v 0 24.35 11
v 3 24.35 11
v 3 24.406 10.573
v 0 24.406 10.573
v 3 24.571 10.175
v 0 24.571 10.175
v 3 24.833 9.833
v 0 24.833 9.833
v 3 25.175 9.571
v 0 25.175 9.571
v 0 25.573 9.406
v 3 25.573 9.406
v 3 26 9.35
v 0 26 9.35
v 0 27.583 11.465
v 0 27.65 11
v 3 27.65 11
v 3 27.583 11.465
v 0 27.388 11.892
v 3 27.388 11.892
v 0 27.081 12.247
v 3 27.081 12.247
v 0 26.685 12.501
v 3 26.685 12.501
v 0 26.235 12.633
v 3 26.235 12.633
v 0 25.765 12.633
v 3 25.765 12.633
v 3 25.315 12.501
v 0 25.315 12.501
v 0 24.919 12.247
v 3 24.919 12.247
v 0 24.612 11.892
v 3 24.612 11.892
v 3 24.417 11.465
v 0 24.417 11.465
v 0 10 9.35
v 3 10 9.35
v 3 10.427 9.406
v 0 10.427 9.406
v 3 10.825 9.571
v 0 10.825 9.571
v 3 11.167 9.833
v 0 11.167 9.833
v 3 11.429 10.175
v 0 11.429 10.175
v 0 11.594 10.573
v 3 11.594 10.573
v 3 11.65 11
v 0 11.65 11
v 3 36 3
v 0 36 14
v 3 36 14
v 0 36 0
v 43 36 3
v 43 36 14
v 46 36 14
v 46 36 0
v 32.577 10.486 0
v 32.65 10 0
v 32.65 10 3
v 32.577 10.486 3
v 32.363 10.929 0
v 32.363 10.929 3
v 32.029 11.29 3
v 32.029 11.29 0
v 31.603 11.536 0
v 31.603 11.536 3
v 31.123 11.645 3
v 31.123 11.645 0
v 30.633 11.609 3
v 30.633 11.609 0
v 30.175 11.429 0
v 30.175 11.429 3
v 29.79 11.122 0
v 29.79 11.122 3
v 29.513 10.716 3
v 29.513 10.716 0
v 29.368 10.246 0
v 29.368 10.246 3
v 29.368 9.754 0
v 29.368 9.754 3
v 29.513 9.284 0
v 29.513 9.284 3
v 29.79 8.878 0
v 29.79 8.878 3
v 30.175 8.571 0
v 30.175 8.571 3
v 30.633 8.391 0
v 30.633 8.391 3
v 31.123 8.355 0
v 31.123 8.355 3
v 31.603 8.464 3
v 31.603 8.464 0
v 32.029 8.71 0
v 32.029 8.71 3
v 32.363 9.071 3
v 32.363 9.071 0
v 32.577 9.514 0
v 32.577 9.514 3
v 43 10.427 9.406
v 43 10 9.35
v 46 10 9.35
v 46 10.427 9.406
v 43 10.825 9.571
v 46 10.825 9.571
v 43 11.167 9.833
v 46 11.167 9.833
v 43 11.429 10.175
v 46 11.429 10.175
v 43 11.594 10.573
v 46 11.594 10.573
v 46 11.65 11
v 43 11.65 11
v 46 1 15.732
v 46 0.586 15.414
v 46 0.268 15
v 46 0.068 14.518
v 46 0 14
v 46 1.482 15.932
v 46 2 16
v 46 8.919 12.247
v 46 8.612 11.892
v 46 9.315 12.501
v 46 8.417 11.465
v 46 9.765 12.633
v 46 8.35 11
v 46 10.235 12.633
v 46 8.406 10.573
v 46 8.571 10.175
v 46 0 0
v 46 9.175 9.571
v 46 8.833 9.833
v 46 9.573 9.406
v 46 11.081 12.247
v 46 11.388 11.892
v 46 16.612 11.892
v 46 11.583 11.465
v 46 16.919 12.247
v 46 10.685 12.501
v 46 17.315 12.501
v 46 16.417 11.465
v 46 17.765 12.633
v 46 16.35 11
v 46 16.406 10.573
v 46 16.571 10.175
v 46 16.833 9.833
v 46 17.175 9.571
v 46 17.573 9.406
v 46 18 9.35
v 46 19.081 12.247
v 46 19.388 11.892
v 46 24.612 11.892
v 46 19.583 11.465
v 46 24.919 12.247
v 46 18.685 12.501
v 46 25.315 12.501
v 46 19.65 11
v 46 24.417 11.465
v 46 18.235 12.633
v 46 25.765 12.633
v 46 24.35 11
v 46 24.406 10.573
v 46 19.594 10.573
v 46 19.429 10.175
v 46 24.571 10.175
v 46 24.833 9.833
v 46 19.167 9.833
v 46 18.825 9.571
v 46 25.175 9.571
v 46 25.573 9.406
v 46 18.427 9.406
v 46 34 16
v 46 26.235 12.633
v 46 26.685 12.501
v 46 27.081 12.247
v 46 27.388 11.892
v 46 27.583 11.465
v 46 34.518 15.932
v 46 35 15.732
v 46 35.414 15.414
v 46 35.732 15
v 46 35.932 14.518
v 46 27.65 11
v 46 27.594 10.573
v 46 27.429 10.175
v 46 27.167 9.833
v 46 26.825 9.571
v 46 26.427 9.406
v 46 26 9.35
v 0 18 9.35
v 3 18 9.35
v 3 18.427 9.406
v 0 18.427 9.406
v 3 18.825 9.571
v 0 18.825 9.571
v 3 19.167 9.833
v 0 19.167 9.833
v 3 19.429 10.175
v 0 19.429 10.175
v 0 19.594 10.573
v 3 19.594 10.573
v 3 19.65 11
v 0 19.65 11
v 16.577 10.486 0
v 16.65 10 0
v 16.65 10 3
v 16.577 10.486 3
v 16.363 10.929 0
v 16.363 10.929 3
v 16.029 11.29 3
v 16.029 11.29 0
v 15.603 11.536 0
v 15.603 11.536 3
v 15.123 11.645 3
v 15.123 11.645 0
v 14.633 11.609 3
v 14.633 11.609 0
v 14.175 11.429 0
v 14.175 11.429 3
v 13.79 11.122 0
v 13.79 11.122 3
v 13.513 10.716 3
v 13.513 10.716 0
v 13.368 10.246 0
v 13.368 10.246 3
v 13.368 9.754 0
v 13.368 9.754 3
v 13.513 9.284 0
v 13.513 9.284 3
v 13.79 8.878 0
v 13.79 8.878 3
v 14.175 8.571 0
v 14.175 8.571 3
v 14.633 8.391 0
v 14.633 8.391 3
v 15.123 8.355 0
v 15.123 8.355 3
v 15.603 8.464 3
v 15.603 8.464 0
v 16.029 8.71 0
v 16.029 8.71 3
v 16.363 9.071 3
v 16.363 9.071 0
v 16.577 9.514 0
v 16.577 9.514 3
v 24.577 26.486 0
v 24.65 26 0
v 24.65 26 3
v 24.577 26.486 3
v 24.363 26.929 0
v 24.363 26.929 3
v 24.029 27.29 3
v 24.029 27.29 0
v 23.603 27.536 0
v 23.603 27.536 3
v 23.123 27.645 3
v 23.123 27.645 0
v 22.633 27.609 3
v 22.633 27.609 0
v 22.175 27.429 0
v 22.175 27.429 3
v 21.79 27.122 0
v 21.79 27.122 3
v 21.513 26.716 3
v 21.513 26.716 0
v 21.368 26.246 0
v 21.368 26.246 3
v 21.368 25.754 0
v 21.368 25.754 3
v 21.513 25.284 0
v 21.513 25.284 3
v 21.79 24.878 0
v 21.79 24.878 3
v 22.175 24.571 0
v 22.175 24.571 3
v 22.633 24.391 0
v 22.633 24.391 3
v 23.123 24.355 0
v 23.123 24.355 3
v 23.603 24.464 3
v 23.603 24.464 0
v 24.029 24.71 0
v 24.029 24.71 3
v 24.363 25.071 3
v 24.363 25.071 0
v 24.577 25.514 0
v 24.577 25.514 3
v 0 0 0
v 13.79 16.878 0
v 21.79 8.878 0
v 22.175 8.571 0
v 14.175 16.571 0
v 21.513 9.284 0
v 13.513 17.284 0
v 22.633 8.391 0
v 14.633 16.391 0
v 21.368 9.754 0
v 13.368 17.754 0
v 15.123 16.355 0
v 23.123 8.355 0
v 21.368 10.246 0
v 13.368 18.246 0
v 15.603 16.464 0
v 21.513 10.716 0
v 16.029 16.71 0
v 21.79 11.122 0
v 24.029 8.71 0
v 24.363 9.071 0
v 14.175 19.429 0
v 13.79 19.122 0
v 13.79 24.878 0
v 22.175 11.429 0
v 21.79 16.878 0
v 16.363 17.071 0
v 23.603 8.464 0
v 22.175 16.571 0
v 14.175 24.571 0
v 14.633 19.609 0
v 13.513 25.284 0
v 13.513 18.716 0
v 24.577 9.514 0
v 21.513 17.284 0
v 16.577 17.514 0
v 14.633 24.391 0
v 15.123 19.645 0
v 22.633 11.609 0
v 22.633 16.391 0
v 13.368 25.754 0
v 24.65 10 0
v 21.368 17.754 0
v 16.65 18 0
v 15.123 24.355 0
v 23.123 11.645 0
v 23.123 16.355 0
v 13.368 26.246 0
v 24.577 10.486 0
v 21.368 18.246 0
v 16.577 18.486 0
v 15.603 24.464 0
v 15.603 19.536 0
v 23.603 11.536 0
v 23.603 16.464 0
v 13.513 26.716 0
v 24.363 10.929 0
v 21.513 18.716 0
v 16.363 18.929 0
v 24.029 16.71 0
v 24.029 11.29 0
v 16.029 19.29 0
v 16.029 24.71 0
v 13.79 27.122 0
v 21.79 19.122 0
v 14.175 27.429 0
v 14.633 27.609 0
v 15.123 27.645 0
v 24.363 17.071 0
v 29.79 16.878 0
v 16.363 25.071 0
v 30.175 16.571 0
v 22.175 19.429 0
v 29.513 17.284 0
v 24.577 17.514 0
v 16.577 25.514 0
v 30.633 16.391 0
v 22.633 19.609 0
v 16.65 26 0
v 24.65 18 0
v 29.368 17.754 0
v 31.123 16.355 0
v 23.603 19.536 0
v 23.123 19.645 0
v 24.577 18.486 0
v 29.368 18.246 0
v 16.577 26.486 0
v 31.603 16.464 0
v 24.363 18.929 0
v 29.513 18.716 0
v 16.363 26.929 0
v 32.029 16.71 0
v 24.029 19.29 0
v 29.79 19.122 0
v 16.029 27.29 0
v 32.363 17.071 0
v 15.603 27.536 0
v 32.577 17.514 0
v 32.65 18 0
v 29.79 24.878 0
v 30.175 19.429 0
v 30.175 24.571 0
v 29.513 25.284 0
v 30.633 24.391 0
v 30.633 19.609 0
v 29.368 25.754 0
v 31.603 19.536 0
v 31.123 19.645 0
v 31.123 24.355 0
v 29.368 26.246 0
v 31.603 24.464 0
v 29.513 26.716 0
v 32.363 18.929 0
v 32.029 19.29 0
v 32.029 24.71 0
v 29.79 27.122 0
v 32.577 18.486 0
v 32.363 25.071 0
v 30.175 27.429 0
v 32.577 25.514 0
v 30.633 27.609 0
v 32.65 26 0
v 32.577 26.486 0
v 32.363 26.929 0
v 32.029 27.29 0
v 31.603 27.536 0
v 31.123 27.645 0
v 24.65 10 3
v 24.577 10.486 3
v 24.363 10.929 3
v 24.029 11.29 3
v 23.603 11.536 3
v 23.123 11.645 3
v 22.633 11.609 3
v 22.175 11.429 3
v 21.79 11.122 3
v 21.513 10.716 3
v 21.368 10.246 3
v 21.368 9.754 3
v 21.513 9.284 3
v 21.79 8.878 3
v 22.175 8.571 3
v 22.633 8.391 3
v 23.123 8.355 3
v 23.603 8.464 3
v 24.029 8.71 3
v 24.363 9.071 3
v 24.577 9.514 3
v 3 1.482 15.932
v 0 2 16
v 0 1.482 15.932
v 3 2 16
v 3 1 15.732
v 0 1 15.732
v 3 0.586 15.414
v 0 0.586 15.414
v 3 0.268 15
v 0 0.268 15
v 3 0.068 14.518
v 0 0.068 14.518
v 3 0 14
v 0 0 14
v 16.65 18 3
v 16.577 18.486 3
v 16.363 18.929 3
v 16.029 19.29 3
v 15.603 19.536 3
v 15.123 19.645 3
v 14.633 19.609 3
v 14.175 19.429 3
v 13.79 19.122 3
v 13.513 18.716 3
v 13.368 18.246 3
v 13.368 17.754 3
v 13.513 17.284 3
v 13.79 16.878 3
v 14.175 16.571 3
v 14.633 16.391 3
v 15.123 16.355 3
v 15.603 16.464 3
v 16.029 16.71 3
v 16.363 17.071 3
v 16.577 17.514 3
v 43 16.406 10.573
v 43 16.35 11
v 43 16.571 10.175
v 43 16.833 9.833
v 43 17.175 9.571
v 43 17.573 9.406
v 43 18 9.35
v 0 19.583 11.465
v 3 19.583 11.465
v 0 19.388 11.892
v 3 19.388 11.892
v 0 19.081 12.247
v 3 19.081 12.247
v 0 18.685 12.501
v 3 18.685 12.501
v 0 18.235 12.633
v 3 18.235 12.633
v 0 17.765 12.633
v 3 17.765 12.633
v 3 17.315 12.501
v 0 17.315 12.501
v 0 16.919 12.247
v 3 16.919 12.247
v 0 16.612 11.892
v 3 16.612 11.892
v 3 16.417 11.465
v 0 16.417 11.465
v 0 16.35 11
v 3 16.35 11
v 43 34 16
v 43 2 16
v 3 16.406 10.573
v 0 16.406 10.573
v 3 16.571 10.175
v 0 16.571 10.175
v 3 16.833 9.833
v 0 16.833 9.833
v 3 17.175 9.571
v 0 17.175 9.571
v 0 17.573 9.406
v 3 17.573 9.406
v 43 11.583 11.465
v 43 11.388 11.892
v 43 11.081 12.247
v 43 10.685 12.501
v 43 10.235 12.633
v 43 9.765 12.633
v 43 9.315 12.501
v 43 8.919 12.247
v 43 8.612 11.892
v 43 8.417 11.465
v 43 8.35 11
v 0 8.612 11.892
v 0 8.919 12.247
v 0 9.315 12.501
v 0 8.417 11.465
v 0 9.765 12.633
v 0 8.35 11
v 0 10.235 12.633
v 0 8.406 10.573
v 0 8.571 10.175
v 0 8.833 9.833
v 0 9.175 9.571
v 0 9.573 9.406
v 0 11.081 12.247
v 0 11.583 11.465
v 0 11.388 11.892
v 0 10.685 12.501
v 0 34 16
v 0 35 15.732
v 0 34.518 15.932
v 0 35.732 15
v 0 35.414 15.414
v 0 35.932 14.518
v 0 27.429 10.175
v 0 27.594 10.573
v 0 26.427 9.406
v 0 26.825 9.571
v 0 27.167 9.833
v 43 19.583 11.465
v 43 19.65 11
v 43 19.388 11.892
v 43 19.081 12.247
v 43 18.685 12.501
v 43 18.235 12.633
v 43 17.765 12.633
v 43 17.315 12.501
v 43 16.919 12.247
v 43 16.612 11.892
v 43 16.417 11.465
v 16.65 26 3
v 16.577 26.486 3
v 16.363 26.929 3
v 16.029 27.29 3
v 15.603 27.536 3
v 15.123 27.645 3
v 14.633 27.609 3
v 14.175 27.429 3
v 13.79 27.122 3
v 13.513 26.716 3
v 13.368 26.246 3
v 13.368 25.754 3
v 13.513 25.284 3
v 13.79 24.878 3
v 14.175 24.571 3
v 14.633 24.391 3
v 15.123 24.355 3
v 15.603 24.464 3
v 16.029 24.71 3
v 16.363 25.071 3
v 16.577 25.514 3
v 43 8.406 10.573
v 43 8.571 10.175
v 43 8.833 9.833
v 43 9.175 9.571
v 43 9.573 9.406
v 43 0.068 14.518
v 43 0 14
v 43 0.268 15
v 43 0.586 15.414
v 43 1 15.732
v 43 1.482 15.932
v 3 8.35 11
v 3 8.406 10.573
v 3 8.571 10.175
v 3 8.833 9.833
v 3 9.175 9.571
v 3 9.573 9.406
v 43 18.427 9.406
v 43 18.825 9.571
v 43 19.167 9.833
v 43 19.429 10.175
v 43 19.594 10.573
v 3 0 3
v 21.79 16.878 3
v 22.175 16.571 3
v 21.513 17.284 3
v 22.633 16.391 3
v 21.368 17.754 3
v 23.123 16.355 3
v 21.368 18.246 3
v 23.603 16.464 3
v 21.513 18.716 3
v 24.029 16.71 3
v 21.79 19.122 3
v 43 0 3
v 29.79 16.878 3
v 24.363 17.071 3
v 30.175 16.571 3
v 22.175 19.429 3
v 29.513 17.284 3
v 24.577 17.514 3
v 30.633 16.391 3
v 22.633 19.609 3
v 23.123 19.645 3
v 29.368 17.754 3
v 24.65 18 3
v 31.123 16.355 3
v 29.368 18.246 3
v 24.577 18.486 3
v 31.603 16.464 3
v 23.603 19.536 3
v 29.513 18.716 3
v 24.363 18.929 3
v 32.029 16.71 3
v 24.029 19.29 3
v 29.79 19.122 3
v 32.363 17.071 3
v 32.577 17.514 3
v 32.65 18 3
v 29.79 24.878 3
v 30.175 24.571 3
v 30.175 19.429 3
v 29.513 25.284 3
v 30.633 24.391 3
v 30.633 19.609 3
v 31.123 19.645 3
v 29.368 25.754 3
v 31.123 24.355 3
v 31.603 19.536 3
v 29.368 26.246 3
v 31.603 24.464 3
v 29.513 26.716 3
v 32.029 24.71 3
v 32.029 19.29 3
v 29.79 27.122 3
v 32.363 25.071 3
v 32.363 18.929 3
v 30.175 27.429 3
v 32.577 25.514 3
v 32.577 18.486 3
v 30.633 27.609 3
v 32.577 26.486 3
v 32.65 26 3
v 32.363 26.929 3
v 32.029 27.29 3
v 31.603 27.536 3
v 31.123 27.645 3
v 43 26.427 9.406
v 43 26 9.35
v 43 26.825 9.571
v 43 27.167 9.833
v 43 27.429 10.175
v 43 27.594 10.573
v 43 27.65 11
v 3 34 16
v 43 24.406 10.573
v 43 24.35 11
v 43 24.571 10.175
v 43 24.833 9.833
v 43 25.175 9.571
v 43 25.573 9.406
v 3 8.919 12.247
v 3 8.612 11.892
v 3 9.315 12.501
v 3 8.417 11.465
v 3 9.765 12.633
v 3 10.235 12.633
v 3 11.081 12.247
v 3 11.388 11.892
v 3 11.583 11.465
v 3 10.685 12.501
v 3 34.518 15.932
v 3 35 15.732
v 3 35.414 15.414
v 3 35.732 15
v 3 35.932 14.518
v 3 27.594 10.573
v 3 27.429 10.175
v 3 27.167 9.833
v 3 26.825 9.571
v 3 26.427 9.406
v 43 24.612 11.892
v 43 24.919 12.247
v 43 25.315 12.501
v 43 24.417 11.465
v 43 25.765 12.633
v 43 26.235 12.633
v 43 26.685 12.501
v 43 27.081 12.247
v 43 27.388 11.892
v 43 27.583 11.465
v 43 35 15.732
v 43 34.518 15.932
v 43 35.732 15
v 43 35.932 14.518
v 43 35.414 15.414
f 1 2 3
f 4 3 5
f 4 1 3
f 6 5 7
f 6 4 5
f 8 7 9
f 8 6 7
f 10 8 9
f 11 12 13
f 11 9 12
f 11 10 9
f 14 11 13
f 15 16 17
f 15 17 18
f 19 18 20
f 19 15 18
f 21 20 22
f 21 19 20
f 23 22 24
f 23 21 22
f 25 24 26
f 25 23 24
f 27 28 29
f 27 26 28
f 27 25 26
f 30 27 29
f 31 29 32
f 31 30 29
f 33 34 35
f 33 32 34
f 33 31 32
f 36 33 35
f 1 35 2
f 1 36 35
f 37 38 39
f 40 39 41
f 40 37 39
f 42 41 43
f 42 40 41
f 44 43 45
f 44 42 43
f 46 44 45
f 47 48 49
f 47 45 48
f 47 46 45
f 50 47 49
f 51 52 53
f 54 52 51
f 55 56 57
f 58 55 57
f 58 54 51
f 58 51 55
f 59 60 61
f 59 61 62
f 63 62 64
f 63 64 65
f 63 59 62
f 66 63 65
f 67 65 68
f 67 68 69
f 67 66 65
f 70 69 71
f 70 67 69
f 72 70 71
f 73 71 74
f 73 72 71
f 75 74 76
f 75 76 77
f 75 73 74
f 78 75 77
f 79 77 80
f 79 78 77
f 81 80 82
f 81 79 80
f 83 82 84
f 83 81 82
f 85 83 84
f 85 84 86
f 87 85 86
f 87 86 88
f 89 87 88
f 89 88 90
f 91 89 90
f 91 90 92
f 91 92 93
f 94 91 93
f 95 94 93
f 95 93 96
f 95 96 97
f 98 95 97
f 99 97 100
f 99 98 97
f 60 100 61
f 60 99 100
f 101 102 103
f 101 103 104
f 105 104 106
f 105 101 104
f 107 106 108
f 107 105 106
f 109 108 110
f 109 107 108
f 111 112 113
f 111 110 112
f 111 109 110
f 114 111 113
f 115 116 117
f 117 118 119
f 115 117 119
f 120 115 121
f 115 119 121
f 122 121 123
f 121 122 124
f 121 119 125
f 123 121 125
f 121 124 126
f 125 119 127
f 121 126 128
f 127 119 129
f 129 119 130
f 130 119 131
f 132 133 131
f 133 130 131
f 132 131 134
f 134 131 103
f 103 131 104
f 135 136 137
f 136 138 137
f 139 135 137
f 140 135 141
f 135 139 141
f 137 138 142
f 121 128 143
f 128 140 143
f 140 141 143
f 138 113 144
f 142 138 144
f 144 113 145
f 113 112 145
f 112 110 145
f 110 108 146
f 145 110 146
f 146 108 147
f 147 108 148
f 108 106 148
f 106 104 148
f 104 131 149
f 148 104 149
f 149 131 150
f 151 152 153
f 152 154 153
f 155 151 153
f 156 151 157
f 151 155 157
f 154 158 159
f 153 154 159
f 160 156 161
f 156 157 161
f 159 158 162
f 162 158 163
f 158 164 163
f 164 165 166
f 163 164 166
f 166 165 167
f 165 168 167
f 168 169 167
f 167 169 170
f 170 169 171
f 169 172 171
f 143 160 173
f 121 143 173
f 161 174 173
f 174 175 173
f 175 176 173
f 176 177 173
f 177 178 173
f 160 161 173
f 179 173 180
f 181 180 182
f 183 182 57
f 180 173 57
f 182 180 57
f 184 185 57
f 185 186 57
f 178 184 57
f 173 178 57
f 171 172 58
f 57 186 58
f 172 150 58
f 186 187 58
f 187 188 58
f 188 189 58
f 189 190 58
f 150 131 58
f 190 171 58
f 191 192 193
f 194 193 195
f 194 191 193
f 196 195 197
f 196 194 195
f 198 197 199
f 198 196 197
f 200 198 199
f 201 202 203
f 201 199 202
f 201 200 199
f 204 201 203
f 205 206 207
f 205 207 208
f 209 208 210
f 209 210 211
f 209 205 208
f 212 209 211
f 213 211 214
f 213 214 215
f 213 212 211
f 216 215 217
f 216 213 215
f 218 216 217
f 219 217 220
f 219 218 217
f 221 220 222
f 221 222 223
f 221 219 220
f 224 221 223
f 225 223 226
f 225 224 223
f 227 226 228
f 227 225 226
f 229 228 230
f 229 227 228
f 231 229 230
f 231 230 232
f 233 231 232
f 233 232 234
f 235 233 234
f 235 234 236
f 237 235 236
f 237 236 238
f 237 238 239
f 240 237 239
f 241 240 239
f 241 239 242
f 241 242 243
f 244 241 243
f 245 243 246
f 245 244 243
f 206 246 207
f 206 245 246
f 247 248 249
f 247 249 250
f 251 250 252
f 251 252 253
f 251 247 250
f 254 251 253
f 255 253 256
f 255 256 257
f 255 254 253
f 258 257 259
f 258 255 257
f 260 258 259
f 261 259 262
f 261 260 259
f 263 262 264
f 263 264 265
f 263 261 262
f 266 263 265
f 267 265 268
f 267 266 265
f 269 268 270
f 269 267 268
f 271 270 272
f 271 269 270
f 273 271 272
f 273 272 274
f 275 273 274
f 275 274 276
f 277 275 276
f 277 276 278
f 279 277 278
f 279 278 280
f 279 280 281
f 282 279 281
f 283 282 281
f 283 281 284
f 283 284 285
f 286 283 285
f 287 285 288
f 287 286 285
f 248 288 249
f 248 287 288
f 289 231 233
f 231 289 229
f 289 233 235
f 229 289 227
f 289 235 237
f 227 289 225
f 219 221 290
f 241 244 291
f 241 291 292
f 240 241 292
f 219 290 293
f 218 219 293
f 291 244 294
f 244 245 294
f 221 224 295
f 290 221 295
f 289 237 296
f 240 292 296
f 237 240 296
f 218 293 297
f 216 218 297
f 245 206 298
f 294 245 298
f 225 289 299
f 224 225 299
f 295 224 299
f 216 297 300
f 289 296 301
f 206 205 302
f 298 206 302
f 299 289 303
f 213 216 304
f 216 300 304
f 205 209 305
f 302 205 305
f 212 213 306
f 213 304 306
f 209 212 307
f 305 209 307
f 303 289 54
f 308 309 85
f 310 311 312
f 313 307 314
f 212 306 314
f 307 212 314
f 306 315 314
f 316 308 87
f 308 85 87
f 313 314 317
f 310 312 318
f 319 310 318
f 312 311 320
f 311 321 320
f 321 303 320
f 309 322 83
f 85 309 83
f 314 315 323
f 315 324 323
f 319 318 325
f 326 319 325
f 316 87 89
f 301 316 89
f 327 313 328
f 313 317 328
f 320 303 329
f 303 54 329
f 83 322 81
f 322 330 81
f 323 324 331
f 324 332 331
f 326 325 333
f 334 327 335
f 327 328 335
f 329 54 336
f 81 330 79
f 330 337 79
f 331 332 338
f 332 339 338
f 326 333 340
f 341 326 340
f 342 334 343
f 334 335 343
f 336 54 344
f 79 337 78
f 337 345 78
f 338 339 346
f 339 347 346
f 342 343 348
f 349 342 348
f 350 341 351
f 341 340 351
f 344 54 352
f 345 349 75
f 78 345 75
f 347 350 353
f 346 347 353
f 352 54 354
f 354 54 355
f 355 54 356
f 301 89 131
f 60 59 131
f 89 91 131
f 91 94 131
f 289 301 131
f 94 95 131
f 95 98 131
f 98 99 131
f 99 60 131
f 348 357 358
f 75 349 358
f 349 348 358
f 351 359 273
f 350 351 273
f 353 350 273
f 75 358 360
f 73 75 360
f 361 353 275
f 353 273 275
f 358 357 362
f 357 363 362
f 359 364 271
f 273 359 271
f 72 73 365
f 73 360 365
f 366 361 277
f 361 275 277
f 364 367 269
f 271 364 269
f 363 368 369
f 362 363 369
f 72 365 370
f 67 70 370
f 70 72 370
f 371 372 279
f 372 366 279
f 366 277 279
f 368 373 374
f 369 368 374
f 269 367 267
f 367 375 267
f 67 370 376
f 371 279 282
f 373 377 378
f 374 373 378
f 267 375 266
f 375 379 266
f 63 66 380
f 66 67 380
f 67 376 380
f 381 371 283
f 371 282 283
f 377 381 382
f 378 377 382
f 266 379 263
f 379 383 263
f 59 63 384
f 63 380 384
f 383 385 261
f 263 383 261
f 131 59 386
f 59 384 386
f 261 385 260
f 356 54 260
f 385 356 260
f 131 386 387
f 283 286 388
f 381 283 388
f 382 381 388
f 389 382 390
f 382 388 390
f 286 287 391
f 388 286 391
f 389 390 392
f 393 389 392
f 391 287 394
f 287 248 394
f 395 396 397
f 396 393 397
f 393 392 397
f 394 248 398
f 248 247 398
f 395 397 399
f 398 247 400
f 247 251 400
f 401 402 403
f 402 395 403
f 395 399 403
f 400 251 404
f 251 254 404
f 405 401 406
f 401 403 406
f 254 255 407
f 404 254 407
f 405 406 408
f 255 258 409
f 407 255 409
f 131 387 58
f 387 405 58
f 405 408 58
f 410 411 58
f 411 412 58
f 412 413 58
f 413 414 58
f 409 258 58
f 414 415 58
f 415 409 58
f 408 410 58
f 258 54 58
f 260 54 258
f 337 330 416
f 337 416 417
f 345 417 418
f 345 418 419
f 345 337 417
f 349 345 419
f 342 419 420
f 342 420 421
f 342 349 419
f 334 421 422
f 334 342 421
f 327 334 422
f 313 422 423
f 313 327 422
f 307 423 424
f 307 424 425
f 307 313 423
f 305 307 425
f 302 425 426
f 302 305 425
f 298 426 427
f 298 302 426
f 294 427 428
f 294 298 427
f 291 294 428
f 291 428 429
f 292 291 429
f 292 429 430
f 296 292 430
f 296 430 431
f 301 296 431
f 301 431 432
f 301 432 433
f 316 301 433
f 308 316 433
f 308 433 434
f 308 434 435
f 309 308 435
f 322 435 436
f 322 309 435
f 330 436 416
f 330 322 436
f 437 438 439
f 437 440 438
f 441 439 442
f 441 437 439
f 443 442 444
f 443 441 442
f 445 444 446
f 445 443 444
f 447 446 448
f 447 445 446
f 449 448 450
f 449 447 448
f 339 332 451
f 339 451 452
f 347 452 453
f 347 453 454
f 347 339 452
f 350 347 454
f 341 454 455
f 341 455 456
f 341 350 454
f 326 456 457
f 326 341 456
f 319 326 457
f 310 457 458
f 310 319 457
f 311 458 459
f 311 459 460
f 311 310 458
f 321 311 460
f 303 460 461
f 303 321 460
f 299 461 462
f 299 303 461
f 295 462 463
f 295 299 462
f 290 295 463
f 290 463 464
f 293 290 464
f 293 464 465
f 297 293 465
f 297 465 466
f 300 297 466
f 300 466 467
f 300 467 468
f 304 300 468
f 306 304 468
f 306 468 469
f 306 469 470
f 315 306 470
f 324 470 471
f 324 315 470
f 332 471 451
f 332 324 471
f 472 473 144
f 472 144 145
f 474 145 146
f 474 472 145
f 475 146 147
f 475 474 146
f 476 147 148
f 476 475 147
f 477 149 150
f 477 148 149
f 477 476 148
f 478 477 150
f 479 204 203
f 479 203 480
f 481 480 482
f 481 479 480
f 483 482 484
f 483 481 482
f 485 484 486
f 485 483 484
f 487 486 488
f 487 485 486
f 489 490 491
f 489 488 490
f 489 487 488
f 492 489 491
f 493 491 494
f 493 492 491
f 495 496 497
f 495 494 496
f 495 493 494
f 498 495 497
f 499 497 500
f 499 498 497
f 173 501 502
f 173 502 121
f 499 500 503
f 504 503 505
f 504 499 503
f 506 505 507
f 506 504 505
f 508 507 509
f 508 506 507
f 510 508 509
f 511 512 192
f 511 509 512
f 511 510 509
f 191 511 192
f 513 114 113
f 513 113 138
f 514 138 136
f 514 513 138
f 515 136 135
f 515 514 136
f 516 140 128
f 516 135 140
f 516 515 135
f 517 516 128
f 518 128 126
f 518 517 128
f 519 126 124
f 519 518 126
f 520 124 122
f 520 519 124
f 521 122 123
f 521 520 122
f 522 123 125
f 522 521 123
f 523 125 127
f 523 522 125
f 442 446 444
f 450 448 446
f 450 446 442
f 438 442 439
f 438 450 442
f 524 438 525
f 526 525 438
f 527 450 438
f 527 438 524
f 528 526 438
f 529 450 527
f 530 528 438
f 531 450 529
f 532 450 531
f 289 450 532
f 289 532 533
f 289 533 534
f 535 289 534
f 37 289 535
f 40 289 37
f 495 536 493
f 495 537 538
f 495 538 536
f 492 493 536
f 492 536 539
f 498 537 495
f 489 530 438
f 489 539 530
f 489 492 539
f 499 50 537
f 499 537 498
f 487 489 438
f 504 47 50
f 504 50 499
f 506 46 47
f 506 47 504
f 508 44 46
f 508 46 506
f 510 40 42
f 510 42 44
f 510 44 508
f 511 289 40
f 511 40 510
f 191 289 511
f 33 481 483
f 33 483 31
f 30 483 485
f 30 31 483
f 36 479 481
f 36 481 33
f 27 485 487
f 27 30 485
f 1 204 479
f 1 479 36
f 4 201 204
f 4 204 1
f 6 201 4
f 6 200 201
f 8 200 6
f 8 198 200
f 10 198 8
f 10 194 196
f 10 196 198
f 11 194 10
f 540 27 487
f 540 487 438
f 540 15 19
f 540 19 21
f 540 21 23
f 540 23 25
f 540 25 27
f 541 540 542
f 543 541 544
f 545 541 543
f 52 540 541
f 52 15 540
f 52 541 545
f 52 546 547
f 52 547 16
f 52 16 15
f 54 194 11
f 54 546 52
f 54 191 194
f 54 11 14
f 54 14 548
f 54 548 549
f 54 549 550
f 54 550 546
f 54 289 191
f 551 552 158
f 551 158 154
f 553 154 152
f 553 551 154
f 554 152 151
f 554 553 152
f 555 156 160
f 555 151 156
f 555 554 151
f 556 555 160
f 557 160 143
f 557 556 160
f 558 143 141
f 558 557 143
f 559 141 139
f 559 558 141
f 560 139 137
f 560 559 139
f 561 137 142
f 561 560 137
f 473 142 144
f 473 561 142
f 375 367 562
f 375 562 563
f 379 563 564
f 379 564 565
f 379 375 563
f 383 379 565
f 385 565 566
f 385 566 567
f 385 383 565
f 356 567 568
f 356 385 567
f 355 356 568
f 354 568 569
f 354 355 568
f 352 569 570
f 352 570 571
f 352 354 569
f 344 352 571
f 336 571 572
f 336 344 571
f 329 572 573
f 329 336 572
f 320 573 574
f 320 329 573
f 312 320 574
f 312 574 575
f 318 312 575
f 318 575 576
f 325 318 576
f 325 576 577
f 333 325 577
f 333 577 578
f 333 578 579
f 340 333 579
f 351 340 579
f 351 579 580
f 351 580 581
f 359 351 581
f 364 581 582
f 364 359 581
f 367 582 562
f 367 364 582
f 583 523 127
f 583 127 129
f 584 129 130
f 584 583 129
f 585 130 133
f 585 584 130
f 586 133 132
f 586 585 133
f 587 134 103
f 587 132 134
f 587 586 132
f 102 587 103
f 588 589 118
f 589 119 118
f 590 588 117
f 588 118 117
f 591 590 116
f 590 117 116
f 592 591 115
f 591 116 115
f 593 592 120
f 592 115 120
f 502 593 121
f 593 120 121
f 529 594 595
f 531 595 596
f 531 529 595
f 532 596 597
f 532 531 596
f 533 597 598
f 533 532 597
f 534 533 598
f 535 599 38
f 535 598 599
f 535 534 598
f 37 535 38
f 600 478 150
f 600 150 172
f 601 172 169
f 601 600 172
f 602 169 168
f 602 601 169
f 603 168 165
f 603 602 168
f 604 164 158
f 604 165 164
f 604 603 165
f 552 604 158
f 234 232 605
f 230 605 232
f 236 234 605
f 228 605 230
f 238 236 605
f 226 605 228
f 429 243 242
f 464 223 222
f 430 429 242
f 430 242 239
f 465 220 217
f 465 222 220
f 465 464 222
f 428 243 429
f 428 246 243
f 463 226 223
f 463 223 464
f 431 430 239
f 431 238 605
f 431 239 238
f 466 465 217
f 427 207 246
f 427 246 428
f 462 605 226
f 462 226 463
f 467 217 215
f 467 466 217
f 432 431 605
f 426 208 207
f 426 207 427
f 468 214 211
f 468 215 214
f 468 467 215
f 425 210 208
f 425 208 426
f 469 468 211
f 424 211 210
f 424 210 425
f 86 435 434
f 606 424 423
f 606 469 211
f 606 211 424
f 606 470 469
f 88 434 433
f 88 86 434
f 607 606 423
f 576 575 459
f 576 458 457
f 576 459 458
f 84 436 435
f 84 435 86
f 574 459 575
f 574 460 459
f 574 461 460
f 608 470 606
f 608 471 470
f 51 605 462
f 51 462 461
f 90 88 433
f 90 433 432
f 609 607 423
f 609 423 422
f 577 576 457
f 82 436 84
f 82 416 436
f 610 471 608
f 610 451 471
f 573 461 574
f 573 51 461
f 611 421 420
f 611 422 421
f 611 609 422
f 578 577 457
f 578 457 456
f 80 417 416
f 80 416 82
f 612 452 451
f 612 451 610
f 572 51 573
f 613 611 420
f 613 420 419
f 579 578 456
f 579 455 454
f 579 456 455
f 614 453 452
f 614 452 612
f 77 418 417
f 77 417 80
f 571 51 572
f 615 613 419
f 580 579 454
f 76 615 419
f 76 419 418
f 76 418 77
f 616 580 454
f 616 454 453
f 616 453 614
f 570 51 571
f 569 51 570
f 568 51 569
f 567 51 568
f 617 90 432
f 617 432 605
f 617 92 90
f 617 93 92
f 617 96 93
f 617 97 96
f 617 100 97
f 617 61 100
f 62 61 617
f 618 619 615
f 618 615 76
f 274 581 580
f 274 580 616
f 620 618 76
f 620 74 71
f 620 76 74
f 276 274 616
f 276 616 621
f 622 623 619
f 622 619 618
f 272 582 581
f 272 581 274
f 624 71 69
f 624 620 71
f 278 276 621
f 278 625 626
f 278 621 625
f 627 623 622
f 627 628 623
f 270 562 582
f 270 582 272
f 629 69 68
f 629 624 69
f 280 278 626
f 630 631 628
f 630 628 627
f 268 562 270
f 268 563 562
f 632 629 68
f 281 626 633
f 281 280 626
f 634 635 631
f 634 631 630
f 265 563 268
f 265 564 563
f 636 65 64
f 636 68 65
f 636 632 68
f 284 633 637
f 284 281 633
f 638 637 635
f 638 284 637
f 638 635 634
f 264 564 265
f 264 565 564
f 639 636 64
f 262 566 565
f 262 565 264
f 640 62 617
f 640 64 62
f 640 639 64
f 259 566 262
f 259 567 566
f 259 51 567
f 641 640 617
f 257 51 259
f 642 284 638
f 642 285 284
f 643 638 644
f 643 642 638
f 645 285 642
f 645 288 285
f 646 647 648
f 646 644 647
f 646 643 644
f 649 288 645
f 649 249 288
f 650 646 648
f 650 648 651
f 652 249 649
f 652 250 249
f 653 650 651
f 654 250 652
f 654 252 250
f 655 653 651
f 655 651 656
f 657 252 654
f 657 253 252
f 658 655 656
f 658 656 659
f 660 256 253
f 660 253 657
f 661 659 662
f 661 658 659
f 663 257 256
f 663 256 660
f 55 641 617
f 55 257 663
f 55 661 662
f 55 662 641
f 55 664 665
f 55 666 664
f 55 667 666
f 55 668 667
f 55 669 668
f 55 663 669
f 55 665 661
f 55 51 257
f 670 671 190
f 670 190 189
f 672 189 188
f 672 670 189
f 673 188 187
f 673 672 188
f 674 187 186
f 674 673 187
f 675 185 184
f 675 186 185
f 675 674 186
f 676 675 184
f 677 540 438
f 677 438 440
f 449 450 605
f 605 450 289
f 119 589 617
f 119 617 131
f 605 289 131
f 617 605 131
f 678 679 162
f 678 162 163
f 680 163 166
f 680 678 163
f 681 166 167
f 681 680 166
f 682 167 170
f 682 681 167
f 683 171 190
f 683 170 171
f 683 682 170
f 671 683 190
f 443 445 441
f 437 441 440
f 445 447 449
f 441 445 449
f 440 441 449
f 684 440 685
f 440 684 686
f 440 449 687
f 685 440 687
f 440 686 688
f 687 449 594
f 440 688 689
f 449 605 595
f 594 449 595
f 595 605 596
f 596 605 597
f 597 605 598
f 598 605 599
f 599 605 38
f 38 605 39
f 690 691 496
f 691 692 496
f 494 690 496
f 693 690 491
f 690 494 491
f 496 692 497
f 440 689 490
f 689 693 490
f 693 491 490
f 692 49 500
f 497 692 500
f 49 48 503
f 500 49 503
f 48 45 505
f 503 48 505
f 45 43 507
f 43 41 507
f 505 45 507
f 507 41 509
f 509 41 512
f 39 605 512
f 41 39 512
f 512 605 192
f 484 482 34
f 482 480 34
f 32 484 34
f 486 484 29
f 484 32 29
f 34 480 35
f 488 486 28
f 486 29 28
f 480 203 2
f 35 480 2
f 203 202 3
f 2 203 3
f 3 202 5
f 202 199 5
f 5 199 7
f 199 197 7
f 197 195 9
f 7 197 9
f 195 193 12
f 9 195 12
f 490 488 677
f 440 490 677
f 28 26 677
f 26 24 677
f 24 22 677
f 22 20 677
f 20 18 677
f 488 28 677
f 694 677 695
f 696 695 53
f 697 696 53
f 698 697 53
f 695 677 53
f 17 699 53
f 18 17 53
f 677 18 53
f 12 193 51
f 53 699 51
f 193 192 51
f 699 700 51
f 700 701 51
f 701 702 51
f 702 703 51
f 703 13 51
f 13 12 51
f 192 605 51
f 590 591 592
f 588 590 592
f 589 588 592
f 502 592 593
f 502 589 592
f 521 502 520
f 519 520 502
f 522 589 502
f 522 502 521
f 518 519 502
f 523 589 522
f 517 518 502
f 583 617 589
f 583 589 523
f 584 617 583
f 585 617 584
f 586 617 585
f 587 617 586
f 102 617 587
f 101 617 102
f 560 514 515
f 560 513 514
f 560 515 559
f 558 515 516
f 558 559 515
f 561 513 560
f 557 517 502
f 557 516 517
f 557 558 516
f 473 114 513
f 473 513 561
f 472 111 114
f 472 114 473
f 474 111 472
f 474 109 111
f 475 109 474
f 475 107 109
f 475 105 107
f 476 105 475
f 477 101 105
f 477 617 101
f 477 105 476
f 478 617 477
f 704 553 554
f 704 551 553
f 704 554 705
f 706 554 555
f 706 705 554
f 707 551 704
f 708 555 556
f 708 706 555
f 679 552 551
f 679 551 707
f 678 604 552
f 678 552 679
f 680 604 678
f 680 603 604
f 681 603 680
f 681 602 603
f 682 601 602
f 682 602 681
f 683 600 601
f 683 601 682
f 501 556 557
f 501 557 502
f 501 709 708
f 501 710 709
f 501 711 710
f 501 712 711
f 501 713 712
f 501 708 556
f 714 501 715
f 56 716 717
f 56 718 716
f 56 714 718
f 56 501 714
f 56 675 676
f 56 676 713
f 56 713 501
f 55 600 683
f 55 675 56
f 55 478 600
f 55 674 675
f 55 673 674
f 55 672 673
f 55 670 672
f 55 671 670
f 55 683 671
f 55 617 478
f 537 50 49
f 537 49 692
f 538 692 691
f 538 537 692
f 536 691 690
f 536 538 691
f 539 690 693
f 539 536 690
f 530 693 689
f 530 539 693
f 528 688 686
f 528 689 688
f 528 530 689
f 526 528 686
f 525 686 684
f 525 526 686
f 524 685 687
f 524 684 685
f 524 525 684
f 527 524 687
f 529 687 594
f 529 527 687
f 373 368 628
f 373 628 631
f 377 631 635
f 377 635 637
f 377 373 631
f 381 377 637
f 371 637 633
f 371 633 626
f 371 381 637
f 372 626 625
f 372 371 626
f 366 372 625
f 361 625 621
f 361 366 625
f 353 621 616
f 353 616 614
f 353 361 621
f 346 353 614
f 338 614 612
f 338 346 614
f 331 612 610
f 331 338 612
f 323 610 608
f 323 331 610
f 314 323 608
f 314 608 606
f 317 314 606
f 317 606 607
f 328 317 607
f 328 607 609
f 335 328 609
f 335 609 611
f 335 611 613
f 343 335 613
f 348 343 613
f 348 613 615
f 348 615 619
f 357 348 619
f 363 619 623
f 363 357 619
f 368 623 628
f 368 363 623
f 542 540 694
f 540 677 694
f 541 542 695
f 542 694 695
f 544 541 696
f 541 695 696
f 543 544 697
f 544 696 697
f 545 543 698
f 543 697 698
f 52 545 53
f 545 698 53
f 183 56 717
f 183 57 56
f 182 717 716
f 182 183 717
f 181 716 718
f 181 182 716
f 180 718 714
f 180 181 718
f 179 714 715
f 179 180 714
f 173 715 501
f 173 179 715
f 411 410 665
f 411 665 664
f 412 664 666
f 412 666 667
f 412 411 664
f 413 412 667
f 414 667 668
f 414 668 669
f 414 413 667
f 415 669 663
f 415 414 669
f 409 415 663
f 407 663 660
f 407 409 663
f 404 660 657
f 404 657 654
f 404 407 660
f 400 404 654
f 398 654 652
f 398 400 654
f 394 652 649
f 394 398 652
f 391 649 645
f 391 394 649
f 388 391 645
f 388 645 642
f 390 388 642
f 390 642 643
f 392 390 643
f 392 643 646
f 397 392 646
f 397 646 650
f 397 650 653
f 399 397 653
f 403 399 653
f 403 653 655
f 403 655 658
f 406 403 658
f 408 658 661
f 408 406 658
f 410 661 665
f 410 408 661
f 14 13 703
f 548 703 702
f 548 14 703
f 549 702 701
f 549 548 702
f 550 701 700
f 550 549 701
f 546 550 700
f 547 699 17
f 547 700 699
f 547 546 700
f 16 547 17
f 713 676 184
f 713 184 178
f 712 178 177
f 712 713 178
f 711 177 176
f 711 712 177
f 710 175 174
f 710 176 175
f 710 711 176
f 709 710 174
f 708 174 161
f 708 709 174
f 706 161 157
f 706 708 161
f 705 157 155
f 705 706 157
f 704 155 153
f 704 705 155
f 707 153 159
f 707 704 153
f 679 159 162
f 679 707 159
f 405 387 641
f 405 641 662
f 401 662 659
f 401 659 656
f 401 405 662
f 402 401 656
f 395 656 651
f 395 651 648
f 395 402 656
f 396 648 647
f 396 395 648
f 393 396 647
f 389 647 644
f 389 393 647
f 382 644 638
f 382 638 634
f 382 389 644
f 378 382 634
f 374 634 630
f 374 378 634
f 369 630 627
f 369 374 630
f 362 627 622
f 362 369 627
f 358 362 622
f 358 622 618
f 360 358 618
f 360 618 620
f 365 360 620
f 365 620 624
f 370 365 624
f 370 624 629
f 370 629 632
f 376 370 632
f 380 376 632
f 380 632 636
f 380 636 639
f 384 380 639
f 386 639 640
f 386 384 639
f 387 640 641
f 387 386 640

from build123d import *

# Parameters (mm, degrees)
SKETCH_2_W          = 46
SKETCH_2_H          = 36
SKETCH_2_R          = 1.65
EXTRUDE_1_DEPTH     = 3
SKETCH_3_W          = 3
SKETCH_3_H          = 36
EXTRUDE_2_DEPTH     = 13
CUT_EXTRUDE_1_DEPTH = 50
FILLET_1_R          = 2


with BuildPart() as part:
    # 草图2 → 凸台-拉伸1 (new body)
    with BuildSketch(Plane.XY):
        with Locations((23, 18)):
            Rectangle(SKETCH_2_W, SKETCH_2_H)
        with Locations((23, 18)):
            Circle(SKETCH_2_R, mode=Mode.SUBTRACT)
        with Locations((31, 18)):
            Circle(SKETCH_2_R, mode=Mode.SUBTRACT)
        with Locations((23, 26)):
            Circle(SKETCH_2_R, mode=Mode.SUBTRACT)
        with Locations((31, 26)):
            Circle(SKETCH_2_R, mode=Mode.SUBTRACT)
        with Locations((15, 26)):
            Circle(SKETCH_2_R, mode=Mode.SUBTRACT)
        with Locations((31, 10)):
            Circle(SKETCH_2_R, mode=Mode.SUBTRACT)
        with Locations((15, 18)):
            Circle(SKETCH_2_R, mode=Mode.SUBTRACT)
        with Locations((23, 10)):
            Circle(SKETCH_2_R, mode=Mode.SUBTRACT)
        with Locations((15, 10)):
            Circle(SKETCH_2_R, mode=Mode.SUBTRACT)
    extrude(amount=EXTRUDE_1_DEPTH)

    # 草图3 → 凸台-拉伸2 (add)
    with BuildSketch(Plane.XY.offset(3)):
        with Locations((1.5, 18)):
            Rectangle(SKETCH_3_W, SKETCH_3_H)
        with Locations((44.5, 18)):
            Rectangle(SKETCH_3_W, SKETCH_3_H)
    extrude(amount=EXTRUDE_2_DEPTH)

    # 草图4 → 切除-拉伸1 (cut)
    with BuildSketch(Plane(origin=(0, 0, 0), x_dir=(0, 0, -1), z_dir=(1, 0, 0))):
        with BuildLine():
            ThreePointArc((-9.35, 26), (-9.833273811, 27.166726189), (-11, 27.65))
            Line((-11, 27.65), (-11, 24.35))
            ThreePointArc((-11, 24.35), (-9.833273811, 24.833273811), (-9.35, 26))
        make_face()
        with BuildLine():
            Line((-11, 24.35), (-11, 27.65))
            ThreePointArc((-11, 27.65), (-12.65, 26), (-11, 24.35))
        make_face()
        with BuildLine():
            ThreePointArc((-11, 19.65), (-12.65, 18), (-11, 16.35))
            Line((-11, 16.35), (-11, 19.65))
        make_face()
        with BuildLine():
            Line((-11, 19.65), (-11, 16.35))
            ThreePointArc((-11, 16.35), (-9.833273811, 16.833273811), (-9.35, 18))
            ThreePointArc((-9.35, 18), (-9.833273811, 19.166726189), (-11, 19.65))
        make_face()
        with BuildLine():
            ThreePointArc((-11, 11.65), (-12.65, 10), (-11, 8.35))
            Line((-11, 8.35), (-11, 11.65))
        make_face()
        with BuildLine():
            Line((-11, 11.65), (-11, 8.35))
            ThreePointArc((-11, 8.35), (-9.833273811, 8.833273811), (-9.35, 10))
            ThreePointArc((-9.35, 10), (-9.833273811, 11.166726189), (-11, 11.65))
        make_face()
    extrude(amount=CUT_EXTRUDE_1_DEPTH, mode=Mode.SUBTRACT)

    # 圆角1
    fillet_1_edges = [part.edges().sort_by_distance(p)[0] for p in [
        (1.5, 36, 16),
        (1.5, 0, 16),
        (44.5, 0, 16),
        (44.5, 36, 16),
    ]]
    fillet(fillet_1_edges, radius=FILLET_1_R)


solid = part.part
